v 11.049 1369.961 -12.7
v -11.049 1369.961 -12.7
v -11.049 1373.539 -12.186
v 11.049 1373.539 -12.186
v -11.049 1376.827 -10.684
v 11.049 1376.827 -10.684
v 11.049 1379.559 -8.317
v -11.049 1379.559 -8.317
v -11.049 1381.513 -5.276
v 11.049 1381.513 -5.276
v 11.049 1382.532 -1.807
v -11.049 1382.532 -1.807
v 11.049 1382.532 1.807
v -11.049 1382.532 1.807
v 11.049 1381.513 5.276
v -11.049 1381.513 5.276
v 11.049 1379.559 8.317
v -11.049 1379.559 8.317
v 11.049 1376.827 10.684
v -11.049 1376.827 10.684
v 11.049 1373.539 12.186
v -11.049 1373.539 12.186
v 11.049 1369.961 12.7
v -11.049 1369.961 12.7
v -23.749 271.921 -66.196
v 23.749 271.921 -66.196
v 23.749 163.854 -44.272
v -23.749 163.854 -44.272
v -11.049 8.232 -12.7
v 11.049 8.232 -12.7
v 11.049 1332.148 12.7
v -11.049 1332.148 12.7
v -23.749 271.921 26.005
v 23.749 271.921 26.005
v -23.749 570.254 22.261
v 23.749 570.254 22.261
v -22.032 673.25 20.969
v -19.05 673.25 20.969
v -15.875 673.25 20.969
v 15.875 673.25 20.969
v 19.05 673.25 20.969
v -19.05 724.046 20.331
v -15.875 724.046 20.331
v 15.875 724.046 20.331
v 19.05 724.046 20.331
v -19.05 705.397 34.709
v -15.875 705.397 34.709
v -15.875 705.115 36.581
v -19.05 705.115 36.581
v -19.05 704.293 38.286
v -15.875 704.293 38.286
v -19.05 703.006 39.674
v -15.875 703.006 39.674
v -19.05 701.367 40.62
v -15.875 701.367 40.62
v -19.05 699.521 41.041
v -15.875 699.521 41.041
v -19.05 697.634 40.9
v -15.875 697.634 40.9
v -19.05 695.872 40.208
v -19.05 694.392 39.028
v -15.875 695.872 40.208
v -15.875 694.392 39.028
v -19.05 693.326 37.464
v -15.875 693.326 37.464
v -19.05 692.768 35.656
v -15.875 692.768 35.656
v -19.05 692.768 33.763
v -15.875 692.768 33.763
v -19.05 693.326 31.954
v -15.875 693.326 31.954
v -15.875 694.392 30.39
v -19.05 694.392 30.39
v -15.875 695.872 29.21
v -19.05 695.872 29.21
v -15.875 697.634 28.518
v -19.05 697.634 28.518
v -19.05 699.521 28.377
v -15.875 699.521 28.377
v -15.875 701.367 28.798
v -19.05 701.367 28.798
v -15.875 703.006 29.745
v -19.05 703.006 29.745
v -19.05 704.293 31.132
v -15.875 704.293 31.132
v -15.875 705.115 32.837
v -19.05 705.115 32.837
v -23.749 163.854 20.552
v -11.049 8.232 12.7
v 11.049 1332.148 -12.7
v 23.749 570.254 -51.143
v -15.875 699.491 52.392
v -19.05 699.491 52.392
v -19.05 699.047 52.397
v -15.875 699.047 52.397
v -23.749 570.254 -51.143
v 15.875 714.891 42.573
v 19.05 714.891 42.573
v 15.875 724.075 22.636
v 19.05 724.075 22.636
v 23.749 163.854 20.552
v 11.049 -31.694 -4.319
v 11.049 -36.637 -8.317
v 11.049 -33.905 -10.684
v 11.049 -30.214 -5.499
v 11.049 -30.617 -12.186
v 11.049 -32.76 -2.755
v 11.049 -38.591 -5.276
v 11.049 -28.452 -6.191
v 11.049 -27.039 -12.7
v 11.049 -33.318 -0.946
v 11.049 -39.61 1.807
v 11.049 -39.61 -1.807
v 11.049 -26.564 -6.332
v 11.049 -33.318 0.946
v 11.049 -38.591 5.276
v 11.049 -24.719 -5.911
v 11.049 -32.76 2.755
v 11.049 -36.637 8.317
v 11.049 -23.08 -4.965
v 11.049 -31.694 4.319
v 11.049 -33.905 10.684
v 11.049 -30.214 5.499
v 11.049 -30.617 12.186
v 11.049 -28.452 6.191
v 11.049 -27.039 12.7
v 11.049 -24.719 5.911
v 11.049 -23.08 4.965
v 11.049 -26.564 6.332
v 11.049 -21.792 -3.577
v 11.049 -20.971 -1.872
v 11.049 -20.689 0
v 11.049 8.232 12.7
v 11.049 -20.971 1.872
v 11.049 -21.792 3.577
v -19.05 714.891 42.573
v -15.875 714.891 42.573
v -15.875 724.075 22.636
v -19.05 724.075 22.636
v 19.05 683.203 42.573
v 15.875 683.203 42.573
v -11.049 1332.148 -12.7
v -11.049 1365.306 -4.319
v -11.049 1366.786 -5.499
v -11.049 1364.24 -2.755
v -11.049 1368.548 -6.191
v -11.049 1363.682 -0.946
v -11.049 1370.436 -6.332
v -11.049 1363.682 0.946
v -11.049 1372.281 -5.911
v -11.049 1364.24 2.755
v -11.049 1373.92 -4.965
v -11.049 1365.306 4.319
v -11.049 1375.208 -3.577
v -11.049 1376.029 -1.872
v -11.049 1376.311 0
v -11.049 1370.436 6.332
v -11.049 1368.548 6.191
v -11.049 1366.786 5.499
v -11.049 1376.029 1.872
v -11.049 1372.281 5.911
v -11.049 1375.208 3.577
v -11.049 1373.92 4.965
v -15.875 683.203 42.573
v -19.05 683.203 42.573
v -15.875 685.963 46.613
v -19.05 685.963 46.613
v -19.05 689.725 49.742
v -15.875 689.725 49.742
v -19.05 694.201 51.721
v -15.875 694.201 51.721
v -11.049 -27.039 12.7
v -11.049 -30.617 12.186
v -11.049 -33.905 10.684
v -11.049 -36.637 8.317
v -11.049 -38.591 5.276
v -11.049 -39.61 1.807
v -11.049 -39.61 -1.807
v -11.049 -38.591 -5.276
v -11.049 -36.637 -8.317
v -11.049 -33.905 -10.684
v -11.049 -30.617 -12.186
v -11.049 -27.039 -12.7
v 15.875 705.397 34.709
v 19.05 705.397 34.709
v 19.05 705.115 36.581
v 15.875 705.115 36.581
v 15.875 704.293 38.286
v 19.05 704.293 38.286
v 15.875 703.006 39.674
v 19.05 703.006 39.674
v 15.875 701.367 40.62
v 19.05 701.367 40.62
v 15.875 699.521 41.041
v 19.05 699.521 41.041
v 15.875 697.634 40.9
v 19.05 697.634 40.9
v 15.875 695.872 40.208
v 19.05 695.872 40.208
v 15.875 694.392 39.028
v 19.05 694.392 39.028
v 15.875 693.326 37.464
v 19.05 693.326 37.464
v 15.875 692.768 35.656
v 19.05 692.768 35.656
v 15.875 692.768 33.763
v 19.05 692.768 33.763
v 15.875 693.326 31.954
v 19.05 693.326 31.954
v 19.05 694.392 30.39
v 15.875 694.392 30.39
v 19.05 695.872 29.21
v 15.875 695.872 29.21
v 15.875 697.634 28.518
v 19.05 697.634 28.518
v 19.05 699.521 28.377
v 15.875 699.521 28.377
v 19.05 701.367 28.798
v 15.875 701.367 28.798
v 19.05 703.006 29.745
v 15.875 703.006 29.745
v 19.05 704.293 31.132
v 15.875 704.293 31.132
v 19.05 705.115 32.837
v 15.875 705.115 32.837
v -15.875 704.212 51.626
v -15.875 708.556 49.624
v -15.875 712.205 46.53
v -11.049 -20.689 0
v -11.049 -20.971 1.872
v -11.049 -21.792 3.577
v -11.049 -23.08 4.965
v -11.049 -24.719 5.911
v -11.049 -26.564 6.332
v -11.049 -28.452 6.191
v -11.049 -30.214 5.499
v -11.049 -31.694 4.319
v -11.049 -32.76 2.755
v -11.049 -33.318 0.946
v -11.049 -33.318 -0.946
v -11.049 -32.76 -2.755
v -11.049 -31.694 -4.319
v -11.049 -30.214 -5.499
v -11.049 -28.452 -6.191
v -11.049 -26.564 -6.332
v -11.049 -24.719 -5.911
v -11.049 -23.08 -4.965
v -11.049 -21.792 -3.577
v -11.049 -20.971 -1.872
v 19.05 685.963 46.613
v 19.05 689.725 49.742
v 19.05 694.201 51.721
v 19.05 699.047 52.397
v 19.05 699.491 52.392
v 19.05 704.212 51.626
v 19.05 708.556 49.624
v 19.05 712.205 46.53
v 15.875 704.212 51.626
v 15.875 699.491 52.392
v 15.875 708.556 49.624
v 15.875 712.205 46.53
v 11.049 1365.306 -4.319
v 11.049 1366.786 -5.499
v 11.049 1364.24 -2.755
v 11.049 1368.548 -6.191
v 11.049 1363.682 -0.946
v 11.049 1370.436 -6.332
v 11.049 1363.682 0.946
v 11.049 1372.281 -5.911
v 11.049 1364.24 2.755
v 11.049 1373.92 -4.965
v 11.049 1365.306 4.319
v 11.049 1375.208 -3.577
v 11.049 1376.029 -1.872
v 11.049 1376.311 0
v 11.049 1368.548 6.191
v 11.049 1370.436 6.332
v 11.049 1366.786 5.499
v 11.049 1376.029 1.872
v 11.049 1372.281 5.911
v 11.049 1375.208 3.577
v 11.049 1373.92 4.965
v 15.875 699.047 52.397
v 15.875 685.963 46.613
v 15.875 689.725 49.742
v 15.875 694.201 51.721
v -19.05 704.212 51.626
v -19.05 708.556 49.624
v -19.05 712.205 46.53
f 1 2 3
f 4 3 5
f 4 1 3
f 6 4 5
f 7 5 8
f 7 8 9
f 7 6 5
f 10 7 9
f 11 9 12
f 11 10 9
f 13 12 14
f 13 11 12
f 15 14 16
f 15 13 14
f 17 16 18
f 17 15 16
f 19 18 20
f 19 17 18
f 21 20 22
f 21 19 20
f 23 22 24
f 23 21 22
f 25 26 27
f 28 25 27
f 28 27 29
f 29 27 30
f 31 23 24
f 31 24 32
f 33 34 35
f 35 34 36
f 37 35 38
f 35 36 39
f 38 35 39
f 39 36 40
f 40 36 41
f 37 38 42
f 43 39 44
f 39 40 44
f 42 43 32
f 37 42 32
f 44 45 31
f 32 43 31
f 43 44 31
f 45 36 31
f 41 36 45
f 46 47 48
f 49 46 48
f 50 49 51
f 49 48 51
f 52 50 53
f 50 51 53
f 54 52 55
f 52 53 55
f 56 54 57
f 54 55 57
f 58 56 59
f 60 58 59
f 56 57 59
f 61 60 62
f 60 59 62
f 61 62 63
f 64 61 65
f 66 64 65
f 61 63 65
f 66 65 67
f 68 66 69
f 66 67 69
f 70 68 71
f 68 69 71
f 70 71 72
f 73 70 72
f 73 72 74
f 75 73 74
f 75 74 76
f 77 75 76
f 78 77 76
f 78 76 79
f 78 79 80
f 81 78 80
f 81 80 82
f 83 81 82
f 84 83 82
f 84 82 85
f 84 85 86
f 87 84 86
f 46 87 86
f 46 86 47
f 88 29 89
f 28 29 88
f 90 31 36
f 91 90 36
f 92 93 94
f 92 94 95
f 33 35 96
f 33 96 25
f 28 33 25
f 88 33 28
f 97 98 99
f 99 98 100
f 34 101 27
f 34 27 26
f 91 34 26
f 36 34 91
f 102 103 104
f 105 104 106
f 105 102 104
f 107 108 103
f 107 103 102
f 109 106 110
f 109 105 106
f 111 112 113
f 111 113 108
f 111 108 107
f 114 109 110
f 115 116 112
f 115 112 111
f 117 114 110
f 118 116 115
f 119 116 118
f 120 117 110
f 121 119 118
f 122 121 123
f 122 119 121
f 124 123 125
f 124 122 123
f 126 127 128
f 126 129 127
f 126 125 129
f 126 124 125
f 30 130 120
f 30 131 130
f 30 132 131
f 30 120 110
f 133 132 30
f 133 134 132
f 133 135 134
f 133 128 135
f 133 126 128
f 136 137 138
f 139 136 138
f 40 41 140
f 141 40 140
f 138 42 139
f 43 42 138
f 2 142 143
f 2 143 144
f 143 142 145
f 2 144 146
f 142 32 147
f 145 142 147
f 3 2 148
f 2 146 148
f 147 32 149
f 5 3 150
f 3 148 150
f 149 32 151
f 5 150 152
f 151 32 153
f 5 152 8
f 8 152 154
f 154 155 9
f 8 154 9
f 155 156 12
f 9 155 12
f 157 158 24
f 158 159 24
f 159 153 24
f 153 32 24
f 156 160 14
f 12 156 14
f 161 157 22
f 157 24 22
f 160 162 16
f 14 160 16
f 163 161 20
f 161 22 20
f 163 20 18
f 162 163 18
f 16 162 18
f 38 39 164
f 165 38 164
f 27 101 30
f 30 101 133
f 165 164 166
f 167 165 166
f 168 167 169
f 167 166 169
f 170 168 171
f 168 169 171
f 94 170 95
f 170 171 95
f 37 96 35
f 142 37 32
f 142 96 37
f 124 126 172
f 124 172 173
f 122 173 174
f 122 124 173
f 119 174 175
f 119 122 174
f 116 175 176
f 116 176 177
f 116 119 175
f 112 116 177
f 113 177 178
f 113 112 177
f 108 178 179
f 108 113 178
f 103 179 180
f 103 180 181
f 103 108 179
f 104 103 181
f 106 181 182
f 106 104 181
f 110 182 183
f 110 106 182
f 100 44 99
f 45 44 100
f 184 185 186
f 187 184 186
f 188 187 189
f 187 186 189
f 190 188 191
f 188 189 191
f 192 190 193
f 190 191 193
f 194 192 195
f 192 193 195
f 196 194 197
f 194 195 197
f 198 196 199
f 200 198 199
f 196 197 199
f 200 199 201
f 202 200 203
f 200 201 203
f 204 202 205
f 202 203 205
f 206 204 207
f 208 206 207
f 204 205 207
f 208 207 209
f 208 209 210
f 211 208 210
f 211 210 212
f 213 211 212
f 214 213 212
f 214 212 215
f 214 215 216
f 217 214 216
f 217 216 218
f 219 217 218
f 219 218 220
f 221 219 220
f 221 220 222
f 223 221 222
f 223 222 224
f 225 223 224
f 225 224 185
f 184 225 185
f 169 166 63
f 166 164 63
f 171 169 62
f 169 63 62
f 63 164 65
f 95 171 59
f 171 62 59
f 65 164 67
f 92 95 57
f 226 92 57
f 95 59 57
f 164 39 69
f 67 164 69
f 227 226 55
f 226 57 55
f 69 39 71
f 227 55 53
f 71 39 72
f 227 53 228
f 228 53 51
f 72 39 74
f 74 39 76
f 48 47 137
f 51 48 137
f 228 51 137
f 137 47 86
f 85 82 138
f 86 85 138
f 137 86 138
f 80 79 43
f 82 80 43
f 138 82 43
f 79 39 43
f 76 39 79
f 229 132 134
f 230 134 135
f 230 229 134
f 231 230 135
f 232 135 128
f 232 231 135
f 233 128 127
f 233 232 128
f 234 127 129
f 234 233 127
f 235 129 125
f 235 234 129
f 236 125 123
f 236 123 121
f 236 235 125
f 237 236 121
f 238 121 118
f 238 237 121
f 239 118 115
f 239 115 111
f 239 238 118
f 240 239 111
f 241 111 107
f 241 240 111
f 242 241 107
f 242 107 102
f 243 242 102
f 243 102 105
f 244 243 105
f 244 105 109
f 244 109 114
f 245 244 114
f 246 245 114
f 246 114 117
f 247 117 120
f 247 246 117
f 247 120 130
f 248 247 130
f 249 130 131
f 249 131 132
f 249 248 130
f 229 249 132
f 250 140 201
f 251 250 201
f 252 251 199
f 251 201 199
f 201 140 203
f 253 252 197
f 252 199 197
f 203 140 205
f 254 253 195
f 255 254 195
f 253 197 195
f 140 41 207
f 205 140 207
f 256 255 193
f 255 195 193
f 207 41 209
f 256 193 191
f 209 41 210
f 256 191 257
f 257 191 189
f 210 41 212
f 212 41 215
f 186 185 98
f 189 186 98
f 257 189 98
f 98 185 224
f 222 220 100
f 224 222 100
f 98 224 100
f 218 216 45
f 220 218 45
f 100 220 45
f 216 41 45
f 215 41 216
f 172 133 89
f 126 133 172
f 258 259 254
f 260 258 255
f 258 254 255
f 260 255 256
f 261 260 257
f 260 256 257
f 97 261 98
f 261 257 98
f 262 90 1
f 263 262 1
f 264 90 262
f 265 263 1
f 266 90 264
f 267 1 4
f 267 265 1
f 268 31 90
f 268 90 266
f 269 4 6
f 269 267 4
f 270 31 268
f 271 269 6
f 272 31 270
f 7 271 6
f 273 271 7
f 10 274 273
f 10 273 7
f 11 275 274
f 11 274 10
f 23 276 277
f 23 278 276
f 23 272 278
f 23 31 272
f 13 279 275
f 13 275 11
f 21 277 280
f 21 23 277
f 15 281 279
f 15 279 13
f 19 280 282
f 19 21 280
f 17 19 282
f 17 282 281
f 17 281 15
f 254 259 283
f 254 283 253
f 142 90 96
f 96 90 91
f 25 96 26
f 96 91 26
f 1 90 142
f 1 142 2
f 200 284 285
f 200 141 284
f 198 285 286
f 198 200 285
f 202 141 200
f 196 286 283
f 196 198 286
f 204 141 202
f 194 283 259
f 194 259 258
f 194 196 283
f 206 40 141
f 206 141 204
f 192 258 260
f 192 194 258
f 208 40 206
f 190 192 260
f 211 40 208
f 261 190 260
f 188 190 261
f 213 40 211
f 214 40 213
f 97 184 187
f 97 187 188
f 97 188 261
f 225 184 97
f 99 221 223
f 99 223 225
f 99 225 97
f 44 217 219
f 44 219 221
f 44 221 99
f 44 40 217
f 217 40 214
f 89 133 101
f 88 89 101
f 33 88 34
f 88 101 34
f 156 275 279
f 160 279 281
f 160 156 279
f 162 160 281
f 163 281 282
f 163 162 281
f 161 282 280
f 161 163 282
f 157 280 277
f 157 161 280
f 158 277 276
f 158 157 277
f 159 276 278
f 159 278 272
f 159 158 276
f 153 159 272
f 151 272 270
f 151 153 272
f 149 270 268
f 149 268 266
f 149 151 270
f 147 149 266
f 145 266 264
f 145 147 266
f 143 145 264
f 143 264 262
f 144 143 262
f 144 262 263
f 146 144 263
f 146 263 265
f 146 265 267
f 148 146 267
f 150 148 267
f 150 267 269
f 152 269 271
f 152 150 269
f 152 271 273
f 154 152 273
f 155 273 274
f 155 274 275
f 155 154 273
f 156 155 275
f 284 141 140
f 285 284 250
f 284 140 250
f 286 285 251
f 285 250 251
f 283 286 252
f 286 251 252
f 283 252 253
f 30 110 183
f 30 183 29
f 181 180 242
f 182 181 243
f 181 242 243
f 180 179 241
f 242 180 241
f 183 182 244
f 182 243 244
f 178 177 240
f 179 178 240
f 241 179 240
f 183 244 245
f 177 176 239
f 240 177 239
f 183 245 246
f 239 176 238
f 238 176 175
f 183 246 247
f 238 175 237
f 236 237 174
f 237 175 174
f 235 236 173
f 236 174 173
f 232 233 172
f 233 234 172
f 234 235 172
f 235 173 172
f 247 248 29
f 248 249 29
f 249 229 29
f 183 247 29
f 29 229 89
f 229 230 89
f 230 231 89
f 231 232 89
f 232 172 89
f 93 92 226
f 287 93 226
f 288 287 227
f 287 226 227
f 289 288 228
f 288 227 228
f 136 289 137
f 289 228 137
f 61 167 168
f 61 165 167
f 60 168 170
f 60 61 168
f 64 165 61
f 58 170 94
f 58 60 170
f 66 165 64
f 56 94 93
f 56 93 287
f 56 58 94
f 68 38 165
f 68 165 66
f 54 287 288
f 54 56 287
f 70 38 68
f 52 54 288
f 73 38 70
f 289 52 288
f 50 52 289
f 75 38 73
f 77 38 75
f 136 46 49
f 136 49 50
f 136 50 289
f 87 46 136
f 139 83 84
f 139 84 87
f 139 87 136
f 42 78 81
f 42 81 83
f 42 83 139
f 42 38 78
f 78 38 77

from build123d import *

# Parameters (mm, degrees)
F0_R      = 6.35
F1_DEPTH  = 11.049
F3_DEPTH  = 22.098
F5_DEPTH  = 12.7
F6_DEPTH  = 22.098
F8_DEPTH  = 12.7
F10_DEPTH = 228.6
F11_W     = 3.175
F11_H     = 50.8
F12_DEPTH = 31.75
F13_R     = 6.35
F14_DEPTH = 42.8


with BuildPart() as f1:
    # F0 (on Right) → F1 (new body, symmetric)
    with BuildSketch(Plane.YZ):
        with BuildLine():
            Line((1369.9610694916, 12.7), (-27.0389305084, 12.7))
            ThreePointArc((-27.0389305084, 12.7), (-39.7389305084, 0), (-27.0389305084, -12.7))
            Line((-27.0389305084, -12.7), (1369.9610694916, -12.7))
            ThreePointArc((1369.9610694916, -12.7), (1382.6610694916, 0), (1369.9610694916, 12.7))
        make_face()
        with Locations((-27.0389305084, 0)):
            Circle(F0_R, mode=Mode.SUBTRACT)
        with Locations((1369.9610694916, 0)):
            Circle(F0_R, mode=Mode.SUBTRACT)
    extrude(amount=F1_DEPTH, both=True)

    # F2 (on face) → F3 (join, through all)
    with BuildSketch(Plane.YZ.offset(11.049)):
        Polygon((1332.1480751038, -12.7), (8.231587708, -12.7), (271.9207406044, -66.1958232522), align=None)
    extrude(amount=-F3_DEPTH)

    # F4 (on face) → F5 (join)
    with BuildSketch(Plane.YZ.offset(11.049)):
        Polygon((1332.1480751038, 12.7), (8.231587708, 12.7), (8.231587708, -12.7), (271.9207406044, -66.1958232522), (1332.1480751038, -12.7), align=None)
        Polygon((271.9207406044, 26.0049468334), (8.231587708, 12.7), (1332.1480751038, 12.7), align=None)
    extrude(amount=F5_DEPTH)

    # F6 (add, through all): a face of the model
    f6_faces = [f1.faces().sort_by_distance(p)[0] for p in [
        (11.049, 537.4334678054, 17.1349822778),
    ]]
    extrude(f6_faces, amount=F6_DEPTH)

    # F7 (on face) → F8 (join)
    with BuildSketch(Plane(origin=(-11.049, 0, 0), x_dir=(0, -1, 0), z_dir=(-1, 0, 0))):
        Polygon((-1332.1480751038, 12.7), (-1332.1480751038, -12.7), (-271.9207406044, -66.1958232522), (-8.231587708, -12.7), (-8.231587708, 12.7), (-271.9207406044, 26.0049468334), align=None)
    extrude(amount=F8_DEPTH)

    # F9 (on Top) → F10 (cut, symmetric)
    with BuildSketch(Plane.XY):
        Polygon((-23.749, 570.2539157877), (-11.049, 1332.1480751038), (-42.6509715617, 1362.8944158554), (-507.5538158417, 214.9578332901), (-61.7056079209, -33.5918478668), (-11.049, 8.231587708), (-23.749, 163.8539157877), align=None)
        Polygon((23.749, 163.8539157877), (11.049, 8.231587708), (61.7056079209, -33.5918478668), (507.5538158417, 214.9578332901), (42.6509715617, 1362.8944158554), (11.049, 1332.1480751038), (23.749, 570.2539157877), align=None)
    extrude(amount=F10_DEPTH, both=True, mode=Mode.SUBTRACT)

    # F11 (on face) → F12 (join)
    with BuildSketch(Plane(origin=(0, 0.3691040914, 29.4126877667), x_dir=(1, 0, 0), z_dir=(0, 0.0125481573, 0.9999212688))):
        with Locations((-17.4625, 698.334315244)):
            Rectangle(F11_W, F11_H)
        with Locations((17.4625, 698.334315244)):
            Rectangle(F11_W, F11_H)
    extrude(amount=F12_DEPTH)

    # F13 (on face) → F14 (cut, through all)
    with BuildSketch(Plane.YZ.offset(19.05)):
        with BuildLine():
            Line((673.6488423855, 52.7161024408), (673.2504383927, 20.9686021572))
            Line((673.2504383927, 20.9686021572), (683.2025858499, 42.5725283176))
            ThreePointArc((683.2025858499, 42.5725283176), (689.7252525102, 49.7418257688), (699.0468426124, 52.3973792465))
            Line((699.0468426124, 52.3973792465), (673.6488423855, 52.7161024408))
        make_face()
        with Locations((699.0468426124, 34.7091633821)):
            Circle(F13_R)
        with BuildLine():
            Line((714.891099375, 42.5725283176), (724.0753566856, 22.6355229997))
            Line((724.0753566856, 22.6355229997), (724.4448428393, 52.0786560523))
            Line((724.4448428393, 52.0786560523), (699.4907166914, 52.3918090062))
            ThreePointArc((699.4907166914, 52.3918090062), (708.556331026, 49.6236734504), (714.891099375, 42.5725283176))
        make_face()
    extrude(amount=-F14_DEPTH, mode=Mode.SUBTRACT)


solid = f1.part
